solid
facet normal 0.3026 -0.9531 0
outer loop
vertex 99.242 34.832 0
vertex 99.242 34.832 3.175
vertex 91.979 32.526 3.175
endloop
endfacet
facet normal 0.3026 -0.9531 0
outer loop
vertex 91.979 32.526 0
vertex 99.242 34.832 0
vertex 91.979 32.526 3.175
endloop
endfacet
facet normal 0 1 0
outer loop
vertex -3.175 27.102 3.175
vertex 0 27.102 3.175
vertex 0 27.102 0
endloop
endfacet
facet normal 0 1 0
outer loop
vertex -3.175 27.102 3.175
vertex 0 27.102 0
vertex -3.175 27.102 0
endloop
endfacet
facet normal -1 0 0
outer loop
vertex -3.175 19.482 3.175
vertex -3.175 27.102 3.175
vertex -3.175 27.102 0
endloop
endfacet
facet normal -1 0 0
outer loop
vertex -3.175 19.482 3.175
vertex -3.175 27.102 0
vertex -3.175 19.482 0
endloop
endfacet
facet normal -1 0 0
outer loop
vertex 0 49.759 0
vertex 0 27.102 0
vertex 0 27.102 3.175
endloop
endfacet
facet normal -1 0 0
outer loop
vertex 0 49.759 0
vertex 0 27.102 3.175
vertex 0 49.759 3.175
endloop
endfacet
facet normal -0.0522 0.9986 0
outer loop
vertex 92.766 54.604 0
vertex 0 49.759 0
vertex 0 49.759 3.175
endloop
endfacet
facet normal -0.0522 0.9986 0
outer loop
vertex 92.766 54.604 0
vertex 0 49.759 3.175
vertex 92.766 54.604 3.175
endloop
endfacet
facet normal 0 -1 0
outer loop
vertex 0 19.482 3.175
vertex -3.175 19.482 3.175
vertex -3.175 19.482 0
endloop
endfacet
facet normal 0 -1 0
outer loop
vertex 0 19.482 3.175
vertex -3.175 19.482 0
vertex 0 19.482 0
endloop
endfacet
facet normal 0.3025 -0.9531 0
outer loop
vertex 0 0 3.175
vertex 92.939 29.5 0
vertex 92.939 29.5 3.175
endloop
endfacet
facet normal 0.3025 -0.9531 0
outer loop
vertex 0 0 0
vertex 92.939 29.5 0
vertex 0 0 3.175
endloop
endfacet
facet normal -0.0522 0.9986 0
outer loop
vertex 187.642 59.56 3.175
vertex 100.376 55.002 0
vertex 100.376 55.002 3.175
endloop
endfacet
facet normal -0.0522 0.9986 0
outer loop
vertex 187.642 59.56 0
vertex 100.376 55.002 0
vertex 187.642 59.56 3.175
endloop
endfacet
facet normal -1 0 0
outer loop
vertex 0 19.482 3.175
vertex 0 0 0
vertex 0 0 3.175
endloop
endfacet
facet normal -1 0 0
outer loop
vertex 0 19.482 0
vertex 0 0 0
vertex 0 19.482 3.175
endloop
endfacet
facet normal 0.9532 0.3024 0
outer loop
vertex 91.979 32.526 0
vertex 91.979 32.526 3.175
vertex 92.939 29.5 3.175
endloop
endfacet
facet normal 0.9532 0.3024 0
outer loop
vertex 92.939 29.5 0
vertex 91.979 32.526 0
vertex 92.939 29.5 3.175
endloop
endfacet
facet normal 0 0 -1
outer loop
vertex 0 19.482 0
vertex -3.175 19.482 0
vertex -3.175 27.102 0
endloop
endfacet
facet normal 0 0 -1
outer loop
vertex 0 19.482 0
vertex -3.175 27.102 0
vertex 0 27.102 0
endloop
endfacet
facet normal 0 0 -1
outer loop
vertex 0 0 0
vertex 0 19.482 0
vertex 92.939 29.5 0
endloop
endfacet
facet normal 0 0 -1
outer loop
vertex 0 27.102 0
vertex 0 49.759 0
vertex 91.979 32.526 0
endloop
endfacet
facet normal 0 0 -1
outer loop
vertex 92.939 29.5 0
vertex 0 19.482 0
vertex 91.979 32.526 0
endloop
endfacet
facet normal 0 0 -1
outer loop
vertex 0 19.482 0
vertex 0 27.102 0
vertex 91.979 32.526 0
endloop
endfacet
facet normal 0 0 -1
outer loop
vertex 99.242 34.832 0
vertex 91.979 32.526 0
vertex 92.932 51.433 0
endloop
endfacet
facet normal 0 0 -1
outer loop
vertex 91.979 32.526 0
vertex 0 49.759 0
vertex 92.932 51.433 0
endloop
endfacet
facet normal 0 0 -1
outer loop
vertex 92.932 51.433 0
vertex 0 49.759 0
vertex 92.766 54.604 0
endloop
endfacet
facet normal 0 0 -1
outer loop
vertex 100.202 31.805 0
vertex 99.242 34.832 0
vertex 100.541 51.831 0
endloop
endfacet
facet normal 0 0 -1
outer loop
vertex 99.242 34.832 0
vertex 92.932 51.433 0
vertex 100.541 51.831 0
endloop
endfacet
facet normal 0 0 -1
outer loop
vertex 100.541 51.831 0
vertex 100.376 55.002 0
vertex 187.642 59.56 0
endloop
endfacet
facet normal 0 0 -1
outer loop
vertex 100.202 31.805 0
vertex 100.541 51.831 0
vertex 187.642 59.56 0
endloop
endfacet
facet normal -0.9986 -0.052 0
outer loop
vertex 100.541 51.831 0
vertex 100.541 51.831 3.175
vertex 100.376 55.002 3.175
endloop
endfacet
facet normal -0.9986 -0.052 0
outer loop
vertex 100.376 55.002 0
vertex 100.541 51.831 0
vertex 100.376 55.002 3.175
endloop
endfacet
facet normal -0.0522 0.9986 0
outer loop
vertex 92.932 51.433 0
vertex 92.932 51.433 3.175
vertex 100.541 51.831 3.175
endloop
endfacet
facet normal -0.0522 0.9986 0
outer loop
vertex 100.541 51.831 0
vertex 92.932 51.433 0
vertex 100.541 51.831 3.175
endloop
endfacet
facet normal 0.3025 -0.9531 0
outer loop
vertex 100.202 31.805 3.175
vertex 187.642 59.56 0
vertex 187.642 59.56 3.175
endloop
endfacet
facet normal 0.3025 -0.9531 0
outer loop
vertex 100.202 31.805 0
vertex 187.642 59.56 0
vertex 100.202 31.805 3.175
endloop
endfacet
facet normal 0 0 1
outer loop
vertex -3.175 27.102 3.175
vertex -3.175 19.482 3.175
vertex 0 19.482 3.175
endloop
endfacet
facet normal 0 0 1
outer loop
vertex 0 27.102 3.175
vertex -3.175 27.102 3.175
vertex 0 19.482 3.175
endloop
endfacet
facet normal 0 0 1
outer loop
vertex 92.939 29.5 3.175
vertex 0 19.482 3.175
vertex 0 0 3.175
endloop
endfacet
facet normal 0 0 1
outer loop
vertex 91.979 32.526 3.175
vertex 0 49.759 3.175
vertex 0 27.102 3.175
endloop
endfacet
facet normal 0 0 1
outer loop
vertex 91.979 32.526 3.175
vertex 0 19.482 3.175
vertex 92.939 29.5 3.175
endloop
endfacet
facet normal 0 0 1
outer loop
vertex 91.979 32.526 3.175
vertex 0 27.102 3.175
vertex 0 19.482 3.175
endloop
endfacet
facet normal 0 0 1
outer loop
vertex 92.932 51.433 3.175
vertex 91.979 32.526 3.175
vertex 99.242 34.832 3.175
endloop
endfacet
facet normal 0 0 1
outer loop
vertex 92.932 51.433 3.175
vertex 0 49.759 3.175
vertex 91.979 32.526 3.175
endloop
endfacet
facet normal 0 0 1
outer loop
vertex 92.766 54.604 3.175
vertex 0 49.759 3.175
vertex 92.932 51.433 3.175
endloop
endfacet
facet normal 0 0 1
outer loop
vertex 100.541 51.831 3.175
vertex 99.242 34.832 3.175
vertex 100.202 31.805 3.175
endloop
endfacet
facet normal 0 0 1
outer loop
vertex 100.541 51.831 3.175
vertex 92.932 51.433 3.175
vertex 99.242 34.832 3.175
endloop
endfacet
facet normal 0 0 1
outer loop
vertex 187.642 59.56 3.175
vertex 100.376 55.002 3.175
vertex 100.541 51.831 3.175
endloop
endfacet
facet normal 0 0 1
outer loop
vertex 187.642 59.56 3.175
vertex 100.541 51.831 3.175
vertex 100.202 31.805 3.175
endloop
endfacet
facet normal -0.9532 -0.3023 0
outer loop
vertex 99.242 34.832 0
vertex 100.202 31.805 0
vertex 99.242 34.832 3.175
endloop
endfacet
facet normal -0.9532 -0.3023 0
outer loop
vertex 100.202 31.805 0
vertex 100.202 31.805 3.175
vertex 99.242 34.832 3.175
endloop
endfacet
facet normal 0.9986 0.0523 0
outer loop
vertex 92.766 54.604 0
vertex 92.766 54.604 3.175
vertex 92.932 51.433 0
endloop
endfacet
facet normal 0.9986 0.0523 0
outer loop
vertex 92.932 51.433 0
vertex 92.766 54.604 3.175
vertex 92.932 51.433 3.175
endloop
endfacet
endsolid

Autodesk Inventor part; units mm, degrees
ref_plane "YZ Plane" through (0, 0, 0) normal (1, 0, 0) x (0, 1, 0)
ref_plane "XZ Plane" through (0, 0, 0) normal (0, 1, 0) x (-1, 0, 0)
ref_plane "XY Plane" through (0, 0, 0) normal (0, 0, 1) x (1, 0, 0)
sketch "Sketch1" plane through (0, 0, 0) normal (0, 0, 1) x (1, 0, 0)
  line L0 (0, 0) -> (0, 49.7586)
  line L1 (0, 49.7586) -> (187.6422, 59.5597)
  line L2 (187.6422, 59.5597) -> (0, 0)
  dimension "d0" = 49.7586
  dimension "d40" = 92.99
  dimension "d41" = 72.39
extrude "Extrusion1" add sketch "Sketch1" along normal blind 3.175
sketch "Sketch3" plane through (0, 0, 3.175) normal (0, 0, 1) x (1, 0, 0)
  line L0 (0, 49.7586) -> (0, 0) projected
  line L1 (0, 27.1018) -> (-3.175, 27.1018)
  line L2 (-3.175, 27.1018) -> (-3.175, 19.4818)
  line L3 (-3.175, 19.4818) -> (0, 19.4818)
  line L4 (0, 27.1018) -> (0, 19.4818)
  point P0 (0, 23.2918)
  dimension "d9" = 7.62
  dimension "d11" = 3.175
  dimension "d43" = 26.4668
  dimension "d44" = 3.81
extrude "Extrusion3" add sketch "Sketch3" against normal blind 3.175
sketch "Sketch5" plane through (0, 0, 3.175) normal (0, 0, 1) x (1, 0, 0)
  line L0 (187.6422, 59.5597) -> (0, 49.7586) projected
  line L1 (0, 0) -> (187.6422, 59.5597) projected
  line L2 (92.766, 54.604) -> (92.9316, 51.4333)
  line L3 (92.9316, 51.4333) -> (100.5412, 51.8308)
  line L4 (100.5412, 51.8308) -> (100.3756, 55.0015)
  line L5 (92.766, 54.604) -> (100.3756, 55.0015)
  line L6 (100.2023, 31.8053) -> (99.2417, 34.8315)
  line L7 (99.2417, 34.8315) -> (91.9788, 32.5262)
  line L8 (91.9788, 32.5262) -> (92.9393, 29.5)
  line L9 (92.9393, 29.5) -> (100.2023, 31.8053)
  point P0 (96.5708, 54.8028)
  point P1 (96.5708, 30.6526)
  dimension "d32" = 7.62
  dimension "d34" = 3.175
  dimension "d35" = 3.175
  dimension "d36" = 7.62
  dimension "d45" = 96.5708
  dimension "d46" = 96.5708
  dimension "d47" = 3.81
  dimension "d48" = 3.81
extrude "Extrusion5" cut sketch "Sketch5" against normal blind 25.4
sketch "Sketch6" plane through (0, 0, 3.175) normal (0, 0, 1) x (1, 0, 0)
  line L0 (0, 0) -> (0, 19.4818)
  line L1 (0, 19.4818) -> (0, 0) projected
  line L2 (0, 19.4818) -> (-3.175, 19.4818)
  line L3 (-3.175, 19.4818) -> (0, 19.4818) projected
  line L4 (-3.175, 19.4818) -> (-3.175, 27.1018)
  line L5 (-3.175, 27.1018) -> (-3.175, 19.4818) projected
  line L6 (-3.175, 27.1018) -> (0, 27.1018)
  line L7 (0, 27.1018) -> (-3.175, 27.1018) projected
  line L8 (0, 27.1018) -> (0, 49.7586)
  line L9 (0, 49.7586) -> (0, 27.1018) projected
  line L10 (0, 49.7586) -> (92.766, 54.604)
  line L11 (92.766, 54.604) -> (0, 49.7586) projected
  line L12 (92.766, 54.604) -> (92.9316, 51.4333)
  line L13 (92.9316, 51.4333) -> (100.5412, 51.8308)
  line L14 (100.5412, 51.8308) -> (92.9316, 51.4333) projected
  line L15 (100.5412, 51.8308) -> (100.3756, 55.0015)
  line L16 (100.3756, 55.0015) -> (100.5412, 51.8308) projected
  line L17 (100.3756, 55.0015) -> (187.6422, 59.5597)
  line L18 (100.3756, 55.0015) -> (187.6422, 59.5597) projected
  line L19 (187.6422, 59.5597) -> (100.2023, 31.8053)
  line L20 (100.2023, 31.8053) -> (187.6422, 59.5597) projected
  line L21 (100.2023, 31.8053) -> (99.2417, 34.8315)
  line L22 (99.2417, 34.8315) -> (91.9788, 32.5262)
  line L23 (91.9788, 32.5262) -> (92.9393, 29.5)
  line L24 (91.9788, 32.5262) -> (92.9393, 29.5) projected
  line L25 (92.9393, 29.5) -> (0, 0)
properties part number "Star Side" material "Wood (Birch)"
